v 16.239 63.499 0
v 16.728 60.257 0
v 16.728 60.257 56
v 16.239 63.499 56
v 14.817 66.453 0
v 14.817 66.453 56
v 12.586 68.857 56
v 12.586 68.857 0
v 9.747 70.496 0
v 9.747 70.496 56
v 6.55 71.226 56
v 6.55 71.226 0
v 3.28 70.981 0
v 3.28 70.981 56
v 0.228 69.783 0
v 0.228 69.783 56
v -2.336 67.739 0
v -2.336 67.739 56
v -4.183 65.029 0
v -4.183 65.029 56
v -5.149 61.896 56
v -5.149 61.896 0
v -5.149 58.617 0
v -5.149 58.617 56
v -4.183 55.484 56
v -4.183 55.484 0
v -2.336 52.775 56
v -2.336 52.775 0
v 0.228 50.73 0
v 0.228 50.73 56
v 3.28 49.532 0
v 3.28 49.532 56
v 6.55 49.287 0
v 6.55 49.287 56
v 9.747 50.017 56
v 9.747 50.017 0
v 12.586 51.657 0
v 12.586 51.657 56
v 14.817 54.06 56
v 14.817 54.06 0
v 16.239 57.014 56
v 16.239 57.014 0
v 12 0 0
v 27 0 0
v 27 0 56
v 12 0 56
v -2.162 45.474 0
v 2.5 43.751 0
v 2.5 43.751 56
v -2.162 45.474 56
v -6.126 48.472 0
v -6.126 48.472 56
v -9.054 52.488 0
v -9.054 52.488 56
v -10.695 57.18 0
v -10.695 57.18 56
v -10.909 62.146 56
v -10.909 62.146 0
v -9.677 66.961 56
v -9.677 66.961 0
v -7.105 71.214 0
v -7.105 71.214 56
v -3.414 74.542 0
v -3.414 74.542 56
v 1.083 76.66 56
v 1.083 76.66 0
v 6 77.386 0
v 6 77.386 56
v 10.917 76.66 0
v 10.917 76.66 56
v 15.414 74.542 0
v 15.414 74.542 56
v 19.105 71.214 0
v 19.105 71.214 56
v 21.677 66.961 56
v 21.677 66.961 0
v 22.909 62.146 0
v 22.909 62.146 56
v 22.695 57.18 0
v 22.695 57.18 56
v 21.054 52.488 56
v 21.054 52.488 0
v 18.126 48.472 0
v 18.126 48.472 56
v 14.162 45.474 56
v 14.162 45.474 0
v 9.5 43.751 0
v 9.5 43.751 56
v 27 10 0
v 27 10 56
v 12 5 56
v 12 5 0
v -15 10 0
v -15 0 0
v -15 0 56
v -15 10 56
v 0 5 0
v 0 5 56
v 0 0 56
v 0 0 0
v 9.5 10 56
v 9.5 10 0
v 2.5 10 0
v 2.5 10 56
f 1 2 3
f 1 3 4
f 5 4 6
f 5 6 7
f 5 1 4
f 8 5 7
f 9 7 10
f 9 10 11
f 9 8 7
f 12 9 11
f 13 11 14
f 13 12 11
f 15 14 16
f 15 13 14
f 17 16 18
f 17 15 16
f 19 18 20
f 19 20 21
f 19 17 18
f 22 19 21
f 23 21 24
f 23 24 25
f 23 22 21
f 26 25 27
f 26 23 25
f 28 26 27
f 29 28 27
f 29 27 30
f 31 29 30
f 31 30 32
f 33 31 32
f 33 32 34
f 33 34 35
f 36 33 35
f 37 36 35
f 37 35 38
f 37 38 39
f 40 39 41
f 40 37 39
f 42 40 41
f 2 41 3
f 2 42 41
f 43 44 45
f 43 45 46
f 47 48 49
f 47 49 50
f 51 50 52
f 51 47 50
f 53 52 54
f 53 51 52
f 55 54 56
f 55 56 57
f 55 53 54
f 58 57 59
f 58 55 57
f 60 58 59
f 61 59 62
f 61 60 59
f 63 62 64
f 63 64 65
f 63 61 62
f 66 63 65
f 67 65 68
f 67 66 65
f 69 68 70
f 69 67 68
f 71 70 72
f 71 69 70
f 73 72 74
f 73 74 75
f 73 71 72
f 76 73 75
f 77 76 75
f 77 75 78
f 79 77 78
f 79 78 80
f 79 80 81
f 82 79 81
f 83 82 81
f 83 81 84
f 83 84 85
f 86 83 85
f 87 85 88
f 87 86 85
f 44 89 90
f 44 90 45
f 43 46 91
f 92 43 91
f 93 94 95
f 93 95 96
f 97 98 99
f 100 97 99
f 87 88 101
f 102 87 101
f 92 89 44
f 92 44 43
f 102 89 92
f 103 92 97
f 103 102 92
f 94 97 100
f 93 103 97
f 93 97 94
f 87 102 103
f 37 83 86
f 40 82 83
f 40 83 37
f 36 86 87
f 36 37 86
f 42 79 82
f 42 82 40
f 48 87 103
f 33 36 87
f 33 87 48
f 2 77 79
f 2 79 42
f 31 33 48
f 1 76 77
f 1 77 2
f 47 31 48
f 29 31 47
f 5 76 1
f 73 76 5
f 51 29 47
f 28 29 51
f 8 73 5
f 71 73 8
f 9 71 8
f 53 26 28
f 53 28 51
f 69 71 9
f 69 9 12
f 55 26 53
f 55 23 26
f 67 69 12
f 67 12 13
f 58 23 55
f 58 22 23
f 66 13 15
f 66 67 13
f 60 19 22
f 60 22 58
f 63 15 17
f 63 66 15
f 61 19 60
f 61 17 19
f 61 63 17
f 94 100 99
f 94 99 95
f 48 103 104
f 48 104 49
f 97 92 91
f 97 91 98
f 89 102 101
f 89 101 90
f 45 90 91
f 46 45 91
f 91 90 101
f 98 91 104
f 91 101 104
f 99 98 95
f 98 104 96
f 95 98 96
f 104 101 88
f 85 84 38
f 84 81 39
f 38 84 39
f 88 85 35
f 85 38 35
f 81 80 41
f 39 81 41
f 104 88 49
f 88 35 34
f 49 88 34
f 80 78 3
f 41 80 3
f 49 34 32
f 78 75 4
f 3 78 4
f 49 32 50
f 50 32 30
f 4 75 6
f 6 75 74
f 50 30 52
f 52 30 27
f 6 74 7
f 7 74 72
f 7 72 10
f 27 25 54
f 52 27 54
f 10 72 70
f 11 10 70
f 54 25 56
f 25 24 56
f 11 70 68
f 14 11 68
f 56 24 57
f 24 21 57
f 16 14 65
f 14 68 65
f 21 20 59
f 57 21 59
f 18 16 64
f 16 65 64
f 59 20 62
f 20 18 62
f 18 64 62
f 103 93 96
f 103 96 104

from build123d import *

# Parameters (mm, degrees)
SKETCH3_R           = 11
BOSS_EXTRUDE1_DEPTH = 56


with BuildPart() as part:
    # Sketch3 → Boss-Extrude1 (new body)
    with BuildSketch(Plane.XY):
        with BuildLine():
            Line((0, 0), (-15, 0))
            Line((-15, 0), (-15, 10))
            Line((-15, 10), (2.5, 10))
            Line((2.5, 10), (2.5, 43.750570873))
            ThreePointArc((2.5, 43.750570873), (6, 77.386375632), (9.5, 43.750570873))
            Line((9.5, 43.750570873), (9.5, 10))
            Line((9.5, 10), (27, 10))
            Line((27, 10), (27, 0))
            Line((27, 0), (12, 0))
            Line((12, 0), (12, 5))
            Line((12, 5), (0, 5))
            Line((0, 5), (0, 0))
        make_face()
        with Locations((5.728023625, 60.256681192)):
            Circle(SKETCH3_R, mode=Mode.SUBTRACT)
    extrude(amount=BOSS_EXTRUDE1_DEPTH)


solid = part.part
